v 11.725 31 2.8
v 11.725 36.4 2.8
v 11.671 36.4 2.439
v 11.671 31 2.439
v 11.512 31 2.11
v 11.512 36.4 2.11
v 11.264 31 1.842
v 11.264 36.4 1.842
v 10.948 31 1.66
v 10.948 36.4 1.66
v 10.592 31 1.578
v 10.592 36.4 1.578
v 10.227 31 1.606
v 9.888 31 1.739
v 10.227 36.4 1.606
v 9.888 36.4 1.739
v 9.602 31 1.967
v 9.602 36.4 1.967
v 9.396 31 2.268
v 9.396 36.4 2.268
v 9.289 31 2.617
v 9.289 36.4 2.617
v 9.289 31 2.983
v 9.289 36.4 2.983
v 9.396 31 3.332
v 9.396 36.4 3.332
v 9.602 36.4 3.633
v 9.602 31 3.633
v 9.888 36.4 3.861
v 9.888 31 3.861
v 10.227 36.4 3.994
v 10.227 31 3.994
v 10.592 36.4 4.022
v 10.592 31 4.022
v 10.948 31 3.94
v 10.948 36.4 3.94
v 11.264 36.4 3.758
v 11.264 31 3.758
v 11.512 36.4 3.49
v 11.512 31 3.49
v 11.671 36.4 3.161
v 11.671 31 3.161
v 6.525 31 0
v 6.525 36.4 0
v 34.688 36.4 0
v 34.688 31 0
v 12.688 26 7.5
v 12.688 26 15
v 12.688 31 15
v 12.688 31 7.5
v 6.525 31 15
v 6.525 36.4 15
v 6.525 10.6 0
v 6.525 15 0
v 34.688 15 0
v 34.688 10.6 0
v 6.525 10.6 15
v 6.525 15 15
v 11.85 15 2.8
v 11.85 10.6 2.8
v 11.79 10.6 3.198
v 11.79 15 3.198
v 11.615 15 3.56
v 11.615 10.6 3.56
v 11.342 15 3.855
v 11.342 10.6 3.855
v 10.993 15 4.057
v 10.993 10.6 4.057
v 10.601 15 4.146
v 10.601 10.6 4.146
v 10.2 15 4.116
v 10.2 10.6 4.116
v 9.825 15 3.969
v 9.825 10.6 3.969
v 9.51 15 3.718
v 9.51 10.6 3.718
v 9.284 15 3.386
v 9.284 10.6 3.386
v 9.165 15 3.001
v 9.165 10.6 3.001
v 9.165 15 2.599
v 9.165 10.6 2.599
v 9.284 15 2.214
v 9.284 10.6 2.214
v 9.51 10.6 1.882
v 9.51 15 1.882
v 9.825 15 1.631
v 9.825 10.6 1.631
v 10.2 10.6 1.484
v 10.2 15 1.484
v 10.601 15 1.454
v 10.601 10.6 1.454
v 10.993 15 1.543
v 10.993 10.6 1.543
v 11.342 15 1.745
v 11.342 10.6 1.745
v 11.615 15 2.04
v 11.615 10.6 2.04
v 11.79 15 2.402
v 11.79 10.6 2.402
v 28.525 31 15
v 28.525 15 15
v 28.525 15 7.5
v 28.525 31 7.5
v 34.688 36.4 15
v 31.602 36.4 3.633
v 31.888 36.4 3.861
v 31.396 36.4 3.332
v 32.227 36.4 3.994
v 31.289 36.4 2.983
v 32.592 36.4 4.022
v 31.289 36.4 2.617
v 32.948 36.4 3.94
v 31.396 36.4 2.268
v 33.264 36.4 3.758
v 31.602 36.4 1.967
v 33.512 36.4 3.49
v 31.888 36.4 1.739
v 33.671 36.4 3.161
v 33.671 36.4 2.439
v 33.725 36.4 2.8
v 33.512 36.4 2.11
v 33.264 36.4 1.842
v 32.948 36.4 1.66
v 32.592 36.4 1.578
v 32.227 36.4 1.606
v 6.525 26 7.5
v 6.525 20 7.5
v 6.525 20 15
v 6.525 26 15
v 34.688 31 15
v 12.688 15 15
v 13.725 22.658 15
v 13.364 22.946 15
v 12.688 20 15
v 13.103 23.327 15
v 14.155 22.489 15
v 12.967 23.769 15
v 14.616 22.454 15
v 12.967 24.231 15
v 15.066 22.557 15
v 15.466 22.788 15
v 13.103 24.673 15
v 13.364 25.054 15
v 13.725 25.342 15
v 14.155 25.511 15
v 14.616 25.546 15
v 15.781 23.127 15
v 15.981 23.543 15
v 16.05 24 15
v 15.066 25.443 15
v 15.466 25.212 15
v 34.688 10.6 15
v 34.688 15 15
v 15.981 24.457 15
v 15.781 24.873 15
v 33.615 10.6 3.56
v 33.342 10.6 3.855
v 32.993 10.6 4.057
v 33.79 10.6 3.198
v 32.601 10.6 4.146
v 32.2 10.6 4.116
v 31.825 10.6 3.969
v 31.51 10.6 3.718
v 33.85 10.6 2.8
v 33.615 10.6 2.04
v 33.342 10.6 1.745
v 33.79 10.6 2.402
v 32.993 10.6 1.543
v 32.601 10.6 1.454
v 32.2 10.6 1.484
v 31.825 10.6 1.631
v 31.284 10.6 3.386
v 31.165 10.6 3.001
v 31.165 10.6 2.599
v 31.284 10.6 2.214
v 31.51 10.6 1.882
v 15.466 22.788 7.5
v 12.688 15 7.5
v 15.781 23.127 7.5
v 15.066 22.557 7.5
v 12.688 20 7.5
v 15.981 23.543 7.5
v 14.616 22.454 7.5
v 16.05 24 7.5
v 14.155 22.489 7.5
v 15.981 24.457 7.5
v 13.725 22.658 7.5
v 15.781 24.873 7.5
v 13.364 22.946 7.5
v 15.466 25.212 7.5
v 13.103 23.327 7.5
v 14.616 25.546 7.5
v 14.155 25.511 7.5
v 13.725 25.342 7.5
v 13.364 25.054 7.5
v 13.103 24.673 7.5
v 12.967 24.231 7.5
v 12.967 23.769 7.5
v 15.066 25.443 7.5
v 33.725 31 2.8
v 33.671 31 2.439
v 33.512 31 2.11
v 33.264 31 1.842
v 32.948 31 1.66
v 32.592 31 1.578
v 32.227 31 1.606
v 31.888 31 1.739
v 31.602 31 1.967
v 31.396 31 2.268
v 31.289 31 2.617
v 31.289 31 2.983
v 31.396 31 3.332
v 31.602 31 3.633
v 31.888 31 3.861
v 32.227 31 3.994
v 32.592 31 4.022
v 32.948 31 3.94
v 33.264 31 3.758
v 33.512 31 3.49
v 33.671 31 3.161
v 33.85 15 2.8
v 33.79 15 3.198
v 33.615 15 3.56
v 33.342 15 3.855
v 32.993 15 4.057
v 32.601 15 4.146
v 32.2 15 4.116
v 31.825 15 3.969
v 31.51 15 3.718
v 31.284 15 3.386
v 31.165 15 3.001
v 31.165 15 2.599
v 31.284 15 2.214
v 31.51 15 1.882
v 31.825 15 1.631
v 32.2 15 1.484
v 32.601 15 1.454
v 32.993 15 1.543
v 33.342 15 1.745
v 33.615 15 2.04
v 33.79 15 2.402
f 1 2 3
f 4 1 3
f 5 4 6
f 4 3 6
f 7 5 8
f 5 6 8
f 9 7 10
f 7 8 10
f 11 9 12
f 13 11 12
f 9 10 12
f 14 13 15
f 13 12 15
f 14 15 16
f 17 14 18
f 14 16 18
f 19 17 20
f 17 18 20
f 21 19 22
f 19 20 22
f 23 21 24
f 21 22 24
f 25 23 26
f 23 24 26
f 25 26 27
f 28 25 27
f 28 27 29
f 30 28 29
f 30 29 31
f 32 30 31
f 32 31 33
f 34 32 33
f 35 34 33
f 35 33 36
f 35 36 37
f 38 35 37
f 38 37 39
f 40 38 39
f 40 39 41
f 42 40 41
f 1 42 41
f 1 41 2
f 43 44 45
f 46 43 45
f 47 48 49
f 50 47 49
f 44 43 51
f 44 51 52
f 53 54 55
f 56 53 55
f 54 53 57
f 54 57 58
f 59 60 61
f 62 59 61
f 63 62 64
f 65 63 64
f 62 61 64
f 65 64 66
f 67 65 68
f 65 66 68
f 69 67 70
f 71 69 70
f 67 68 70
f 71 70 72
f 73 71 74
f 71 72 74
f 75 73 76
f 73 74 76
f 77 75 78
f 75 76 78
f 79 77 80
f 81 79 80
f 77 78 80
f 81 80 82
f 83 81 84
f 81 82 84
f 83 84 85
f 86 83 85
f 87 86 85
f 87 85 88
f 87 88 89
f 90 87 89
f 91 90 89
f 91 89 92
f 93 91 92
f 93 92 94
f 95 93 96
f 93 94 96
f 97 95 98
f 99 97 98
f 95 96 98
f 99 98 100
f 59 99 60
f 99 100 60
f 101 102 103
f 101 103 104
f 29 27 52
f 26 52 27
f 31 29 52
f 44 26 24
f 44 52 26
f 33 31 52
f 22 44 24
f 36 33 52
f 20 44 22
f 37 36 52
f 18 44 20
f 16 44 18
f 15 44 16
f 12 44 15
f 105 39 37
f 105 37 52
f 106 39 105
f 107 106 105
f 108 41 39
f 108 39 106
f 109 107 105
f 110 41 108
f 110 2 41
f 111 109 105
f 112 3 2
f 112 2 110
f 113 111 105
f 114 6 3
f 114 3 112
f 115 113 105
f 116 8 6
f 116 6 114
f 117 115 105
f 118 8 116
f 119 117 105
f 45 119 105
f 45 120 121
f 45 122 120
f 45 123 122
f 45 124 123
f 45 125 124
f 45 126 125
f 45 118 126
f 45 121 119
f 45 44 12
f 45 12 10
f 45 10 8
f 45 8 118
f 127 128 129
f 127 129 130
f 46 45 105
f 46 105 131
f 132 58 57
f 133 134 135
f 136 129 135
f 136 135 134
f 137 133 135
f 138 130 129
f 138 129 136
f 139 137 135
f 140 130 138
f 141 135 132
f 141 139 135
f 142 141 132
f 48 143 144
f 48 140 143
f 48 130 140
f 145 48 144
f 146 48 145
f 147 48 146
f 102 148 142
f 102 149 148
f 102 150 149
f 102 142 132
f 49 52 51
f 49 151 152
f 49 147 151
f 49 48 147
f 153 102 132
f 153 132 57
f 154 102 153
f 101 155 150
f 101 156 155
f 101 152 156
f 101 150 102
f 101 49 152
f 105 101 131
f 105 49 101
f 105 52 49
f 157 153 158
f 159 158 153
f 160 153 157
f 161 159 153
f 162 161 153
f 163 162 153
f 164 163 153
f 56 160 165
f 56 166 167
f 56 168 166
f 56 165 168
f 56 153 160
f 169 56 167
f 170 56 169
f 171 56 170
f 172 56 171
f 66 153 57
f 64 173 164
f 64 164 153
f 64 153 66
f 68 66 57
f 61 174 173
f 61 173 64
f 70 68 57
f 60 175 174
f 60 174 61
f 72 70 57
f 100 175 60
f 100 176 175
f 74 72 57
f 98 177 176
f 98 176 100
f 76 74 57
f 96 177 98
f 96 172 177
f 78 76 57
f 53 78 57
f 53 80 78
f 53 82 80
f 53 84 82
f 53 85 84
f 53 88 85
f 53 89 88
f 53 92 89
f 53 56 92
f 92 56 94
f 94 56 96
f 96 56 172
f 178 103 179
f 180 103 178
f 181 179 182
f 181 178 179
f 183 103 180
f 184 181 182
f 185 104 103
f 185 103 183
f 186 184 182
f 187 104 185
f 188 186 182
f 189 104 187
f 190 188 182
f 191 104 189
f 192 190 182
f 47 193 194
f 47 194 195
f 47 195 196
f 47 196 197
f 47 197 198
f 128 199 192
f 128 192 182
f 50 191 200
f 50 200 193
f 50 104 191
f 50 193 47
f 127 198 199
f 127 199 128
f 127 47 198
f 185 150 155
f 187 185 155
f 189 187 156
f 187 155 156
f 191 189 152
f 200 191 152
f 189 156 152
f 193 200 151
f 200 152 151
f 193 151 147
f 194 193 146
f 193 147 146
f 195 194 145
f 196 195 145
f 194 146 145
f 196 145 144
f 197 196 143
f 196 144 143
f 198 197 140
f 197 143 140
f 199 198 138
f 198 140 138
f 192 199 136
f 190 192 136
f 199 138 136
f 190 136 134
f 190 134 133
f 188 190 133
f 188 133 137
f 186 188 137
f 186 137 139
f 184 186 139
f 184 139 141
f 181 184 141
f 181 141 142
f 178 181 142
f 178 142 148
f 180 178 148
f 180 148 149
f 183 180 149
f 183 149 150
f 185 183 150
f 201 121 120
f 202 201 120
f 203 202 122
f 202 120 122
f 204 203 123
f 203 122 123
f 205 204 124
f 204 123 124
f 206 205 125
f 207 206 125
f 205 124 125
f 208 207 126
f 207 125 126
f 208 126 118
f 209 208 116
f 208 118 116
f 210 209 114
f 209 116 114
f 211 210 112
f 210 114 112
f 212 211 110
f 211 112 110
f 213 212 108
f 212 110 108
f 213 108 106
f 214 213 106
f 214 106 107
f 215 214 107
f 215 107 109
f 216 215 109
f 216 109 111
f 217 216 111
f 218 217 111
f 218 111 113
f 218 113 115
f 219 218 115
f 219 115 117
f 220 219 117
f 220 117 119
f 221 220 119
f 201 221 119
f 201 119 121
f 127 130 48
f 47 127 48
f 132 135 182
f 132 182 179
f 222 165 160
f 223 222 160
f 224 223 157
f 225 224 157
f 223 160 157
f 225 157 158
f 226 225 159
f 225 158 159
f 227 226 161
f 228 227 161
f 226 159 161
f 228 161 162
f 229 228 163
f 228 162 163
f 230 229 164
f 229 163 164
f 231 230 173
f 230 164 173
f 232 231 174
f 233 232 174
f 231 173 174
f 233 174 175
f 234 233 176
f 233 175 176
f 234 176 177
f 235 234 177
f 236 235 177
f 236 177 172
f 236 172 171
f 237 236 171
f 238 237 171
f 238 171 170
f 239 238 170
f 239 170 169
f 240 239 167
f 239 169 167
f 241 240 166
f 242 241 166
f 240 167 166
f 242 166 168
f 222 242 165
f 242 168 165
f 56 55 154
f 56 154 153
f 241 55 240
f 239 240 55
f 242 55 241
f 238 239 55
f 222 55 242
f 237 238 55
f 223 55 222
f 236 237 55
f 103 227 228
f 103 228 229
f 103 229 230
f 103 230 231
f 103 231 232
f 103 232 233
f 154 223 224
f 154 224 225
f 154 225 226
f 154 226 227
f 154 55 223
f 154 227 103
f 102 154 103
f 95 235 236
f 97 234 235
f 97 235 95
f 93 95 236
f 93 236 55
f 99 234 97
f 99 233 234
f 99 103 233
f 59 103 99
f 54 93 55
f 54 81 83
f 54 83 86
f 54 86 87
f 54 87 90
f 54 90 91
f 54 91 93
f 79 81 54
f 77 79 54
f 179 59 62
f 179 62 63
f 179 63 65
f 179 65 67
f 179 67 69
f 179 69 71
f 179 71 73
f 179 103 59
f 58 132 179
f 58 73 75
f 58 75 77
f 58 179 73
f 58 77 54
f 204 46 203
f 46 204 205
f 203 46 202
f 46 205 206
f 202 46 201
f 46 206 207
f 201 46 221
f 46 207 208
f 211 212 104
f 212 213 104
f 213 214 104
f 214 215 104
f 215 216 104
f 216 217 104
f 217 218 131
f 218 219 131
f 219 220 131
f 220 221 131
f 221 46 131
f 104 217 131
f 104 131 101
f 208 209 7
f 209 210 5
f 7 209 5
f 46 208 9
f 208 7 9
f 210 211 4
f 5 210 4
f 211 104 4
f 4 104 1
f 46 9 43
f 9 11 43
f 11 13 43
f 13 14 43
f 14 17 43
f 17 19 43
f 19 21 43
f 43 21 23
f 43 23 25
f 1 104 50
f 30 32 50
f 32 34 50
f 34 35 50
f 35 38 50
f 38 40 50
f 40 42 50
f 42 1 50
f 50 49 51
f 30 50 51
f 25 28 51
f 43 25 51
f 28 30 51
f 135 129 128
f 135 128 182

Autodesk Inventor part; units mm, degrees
ref_plane "YZ Plane" through (0, 0, 0) normal (1, 0, 0) x (0, 1, 0)
ref_plane "XZ Plane" through (0, 0, 0) normal (0, 1, 0) x (-1, 0, 0)
ref_plane "XY Plane" through (0, 0, 0) normal (0, 0, 1) x (1, 0, 0)
sketch "스케치1" plane through (0, 0, 0) normal (0, 0, 1) x (1, 0, 0)
  line L0 (7.5, 38) -> (7.5, 36.5) projected
  line L1 (2, 38) -> (7.5, 38) projected
  line L2 (2, 38) -> (2, 8) projected
  line L3 (2, 8) -> (6.525, 8) projected
  line L4 (6.525, 10.5) -> (6.525, 8) projected
  line L5 (6.525, 10.5) -> (10.3997, 10.5) projected
  line L6 (10.3997, 10.5) -> (10.6003, 10.5) projected
  line L7 (10.6003, 10.5) -> (14.475, 10.5) projected
  line L8 (14.475, 10.5) -> (14.475, 8) projected
  line L9 (14.475, 8) -> (28.525, 8) projected
  line L10 (28.525, 10.5) -> (28.525, 8) projected
  line L11 (28.525, 10.5) -> (32.3997, 10.5) projected
  line L12 (32.3997, 10.5) -> (32.6003, 10.5) projected
  line L13 (32.6003, 10.5) -> (34.7876, 10.5) projected
  line L14 (34.7876, 10.5) -> (34.7876, 19.4) projected
  line L15 (36, 19.4) -> (34.7876, 19.4) projected
  line L16 (36, 24) -> (36, 19.4) projected
  line L17 (38.55, 24) -> (36, 24) projected
  line L18 (38.55, 24) -> (38.55, 25.4) projected
  line L19 (38.55, 25.4) -> (37.1, 25.4) projected
  line L20 (37.1, 25.4) -> (37.1, 35.5) projected
  line L21 (49.9, 35.5) -> (37.1, 35.5) projected
  line L22 (49.9, 25.4) -> (49.9, 35.5) projected
  line L23 (49.9, 25.4) -> (48.45, 25.4) projected
  line L24 (48.45, 24) -> (48.45, 25.4) projected
  line L25 (51, 24) -> (48.45, 24) projected
  line L26 (51, 24) -> (51, 10.5) projected
  line L27 (51, 10.5) -> (54.3997, 10.5) projected
  line L28 (54.3997, 10.5) -> (54.6003, 10.5) projected
  line L29 (54.6003, 10.5) -> (57.5, 10.5) projected
  line L30 (57.5, 36.5) -> (57.5, 10.5) projected
  line L31 (57.5, 36.5) -> (51.5, 36.5) projected
  line L32 (51.5, 38) -> (51.5, 36.5) projected
  line L33 (35.5, 38) -> (51.5, 38) projected
  line L34 (35.5, 36.5) -> (35.5, 38) projected
  line L35 (35.5, 36.5) -> (29.5, 36.5) projected
  line L36 (29.5, 38) -> (29.5, 36.5) projected
  line L37 (13.5, 38) -> (29.5, 38) projected
  line L38 (13.5, 36.5) -> (13.5, 38) projected
  line L39 (13.5, 36.5) -> (7.5, 36.5) projected
  line L40 (22.05, 14.2) -> (27.95, 14.2) projected
  line L41 (22.05, 18) -> (22.05, 14.2) projected
  line L42 (27.95, 18) -> (22.05, 18) projected
  line L43 (27.95, 14.2) -> (27.95, 18) projected
  line L44 (34.6876, 10.6) -> (7.6, 10.6)
  line L45 (7.6, 10.6) -> (7.6, 36.4)
  line L46 (7.6, 36.4) -> (34.6876, 36.4)
  line L47 (34.6876, 36.4) -> (34.6876, 10.6)
  line L48 (7.6, 36.4) -> (6.525, 36.4)
  line L49 (7.6, 10.6) -> (6.525, 10.6)
  line L50 (6.525, 10.6) -> (6.525, 36.4)
  line L51 (6.525, 36.4) -> (7.6, 36.4)
  line L52 (7.6, 36.4) -> (7.6, 10.6)
  point P0 (0, 0)
extrude "돌출1" add sketch "스케치1" along normal blind 15 contours L41 L42 L43 L40 | L44 L45 L46 L47 | L49 L50 L48 L45
sketch "스케치2" plane through (0, 0, 15) normal (0, 0, 1) x (1, 0, 0)
  line L0 (34.5, 38) -> (52.5, 38) projected
  line L1 (52.5, 38) -> (52.5, 36.5) projected
  line L2 (56.5, 36.5) -> (52.5, 36.5) projected
  line L3 (56.5, 38) -> (56.5, 36.5) projected
  line L4 (56.5, 38) -> (59.1, 38) projected
  line L5 (59.1, 38) -> (59.1, 40) projected
  line L6 (6, 40) -> (59.1, 40) projected
  line L7 (6, 38) -> (6, 40) projected
  line L8 (6, 38) -> (8.5, 38) projected
  line L9 (8.5, 38) -> (8.5, 36.5) projected
  line L10 (12.5, 36.5) -> (8.5, 36.5) projected
  line L11 (12.5, 38) -> (12.5, 36.5) projected
  line L12 (12.5, 38) -> (30.5, 38) projected
  line L13 (30.5, 38) -> (30.5, 36.5) projected
  line L14 (34.5, 36.5) -> (30.5, 36.5) projected
  line L15 (34.5, 38) -> (34.5, 36.5) projected
  line L16 (14.475, 10.5) -> (12.975, 10.5) projected
  line L17 (12.975, 10.5) -> (12.975, 8.5) projected
  line L18 (12.975, 8.5) -> (8.025, 8.5) projected
  line L19 (8.025, 10.5) -> (8.025, 8.5) projected
  line L20 (8.025, 10.5) -> (6.525, 10.5) projected
  line L21 (6.525, 10.5) -> (6.525, 8) projected
  line L22 (6, 8) -> (6.525, 8) projected
  line L23 (6, 8) -> (6, 6) projected
  line L24 (6, 6) -> (59.1, 6) projected
  line L25 (59.1, 8) -> (59.1, 6) projected
  line L26 (58.475, 8) -> (59.1, 8) projected
  line L27 (58.475, 8) -> (58.475, 10.5) projected
  line L28 (58.475, 10.5) -> (56.975, 10.5) projected
  line L29 (56.975, 10.5) -> (56.975, 8.5) projected
  line L30 (56.975, 8.5) -> (52.025, 8.5) projected
  line L31 (52.025, 10.5) -> (52.025, 8.5) projected
  line L32 (52.025, 10.5) -> (50.525, 10.5) projected
  line L33 (50.525, 10.5) -> (50.525, 8) projected
  line L34 (36.475, 8) -> (50.525, 8) projected
  line L35 (36.475, 8) -> (36.475, 10.5) projected
  line L36 (36.475, 10.5) -> (34.975, 10.5) projected
  line L37 (34.975, 10.5) -> (34.975, 8.5) projected
  line L38 (34.975, 8.5) -> (30.025, 8.5) projected
  line L39 (30.025, 10.5) -> (30.025, 8.5) projected
  line L40 (30.025, 10.5) -> (28.525, 10.5) projected
  line L41 (28.525, 10.5) -> (28.525, 8) projected
  line L42 (14.475, 8) -> (28.525, 8) projected
  line L43 (14.475, 8) -> (14.475, 10.5) projected
  line L44 (14.475, 36.4) -> (28.525, 36.4)
  line L45 (34.6876, 10.6) -> (34.6876, 36.4) projected
  line L46 (14.475, 10.6) -> (28.525, 10.6)
  line L47 (28.525, 10.6) -> (28.525, 36.4)
  line L48 (28.525, 36.4) -> (14.475, 36.4)
  line L49 (-13.0231, 23) -> (78.1205, 23)
  line L50 (14.5, -11.1) -> (14.5, 56.1)
  line L51 (34.6876, 36.4) -> (6.525, 36.4) projected
  line L52 (6.525, 36.4) -> (6.525, 10.6) projected
  line L53 (6.525, 10.6) -> (34.6876, 10.6) projected
  line L54 (28.525, 23) -> (34.6876, 23)
  line L55 (34.6876, 23) -> (34.6876, 31)
  line L56 (34.6876, 31) -> (28.525, 31)
  line L57 (28.525, 31) -> (28.525, 23)
  line L58 (28.525, 23) -> (34.6876, 23)
  line L59 (34.6876, 23) -> (34.6876, 15)
  line L60 (34.6876, 15) -> (28.525, 15)
  line L61 (28.525, 15) -> (28.525, 23)
  line L62 (6.525, 23) -> (12.688, 23)
  line L63 (12.688, 23) -> (12.688, 31)
  line L64 (12.688, 31) -> (6.525, 31)
  line L65 (6.525, 31) -> (6.525, 23)
  line L66 (14.5, 57.1) -> (14.5, -10.1)
  line L67 (12.688, 23) -> (12.688, 15)
  line L68 (12.688, 15) -> (6.525, 15)
  line L69 (6.525, 15) -> (6.525, 23)
  line L70 (6.525, 36.4) -> (6.525, 10.6) projected
  line L71 (12.688, 23) -> (6.525, 23)
  line L72 (6.525, 23) -> (6.525, 26)
  line L73 (6.525, 26) -> (12.688, 26)
  line L74 (12.688, 26) -> (12.688, 23)
  line L75 (12.688, 23) -> (6.525, 23)
  line L76 (6.525, 23) -> (6.525, 20)
  line L77 (6.525, 20) -> (12.688, 20)
  line L78 (12.688, 20) -> (12.688, 23)
  point P0 (0, 0)
  dimension "d3" = 6.163
  dimension "d4" = 8
extrude "돌출2" cut sketch "스케치2" against normal up to next contours L56 L45 L49 L47 | L49 L45 L60 L47 | L64 L63 L73 L52 | L67 L68 L52 L77
sketch "스케치4" plane through (6.525, 10.6, 0) normal (0, -1, 0) x (1, 0, 0)
  circle A0 centre (3.975, 2.8) radius 1.35 projected
  circle A1 centre (25.975, 2.8) radius 1.35
  circle A2 centre (25.975, 2.8) radius 1.55
  circle A3 centre (3.975, 2.8) radius 1.55
  point P0 (-6.525, 0)
  dimension "d14" = 0.2
  dimension "d15" = 0.2
extrude "돌출4" cut sketch "스케치4" against normal up to next contours A0 | A1
sketch "스케치5" plane through (6.525, 36.4, 0) normal (0, 1, 0) x (1, 0, 0)
  circle A0 centre (25.975, -2.8) radius 1.025 projected
  circle A1 centre (3.975, -2.8) radius 1.025 projected
  circle A2 centre (25.975, -2.8) radius 1.225
  circle A3 centre (3.975, -2.8) radius 1.225
  point P0 (-6.525, 0)
  dimension "d16" = 0.2
  dimension "d17" = 0.2
extrude "돌출5" cut sketch "스케치5" against normal up to next contours A0 | A1 | A2 | A3
sketch "스케치6" plane through (0, 0, 0) normal (0, 0, -1) x (-1, 0, 0)
  line L0 (-28.525, 31) -> (-34.6876, 31) projected
  line L1 (-34.6876, 31) -> (-34.6876, 36.4) projected
  line L2 (-34.6876, 36.4) -> (-6.525, 36.4) projected
  line L3 (-6.525, 36.4) -> (-6.525, 31) projected
  line L4 (-6.525, 31) -> (-12.688, 31) projected
  line L5 (-12.688, 31) -> (-12.688, 26) projected
  line L6 (-12.688, 26) -> (-6.525, 26) projected
  line L7 (-6.525, 26) -> (-6.525, 20) projected
  line L8 (-6.525, 20) -> (-12.688, 20) projected
  line L9 (-12.688, 20) -> (-12.688, 15) projected
  line L10 (-12.688, 15) -> (-6.525, 15) projected
  line L11 (-6.525, 15) -> (-6.525, 10.6) projected
  line L12 (-6.525, 10.6) -> (-34.6876, 10.6) projected
  line L13 (-34.6876, 10.6) -> (-34.6876, 15) projected
  line L14 (-34.6876, 15) -> (-28.525, 15) projected
  line L15 (-28.525, 15) -> (-28.525, 31) projected
  line L16 (-12.688, 31) -> (-28.525, 31)
  line L17 (-28.525, 31) -> (-28.525, 15)
  line L18 (-28.525, 15) -> (-12.688, 15)
  line L19 (-12.688, 15) -> (-12.688, 31)
  line L20 (13.0231, 24) -> (-78.1205, 24)
  line L21 (-14.5, 58.1) -> (-14.5, -9.1)
  point P0 (0, 0)
extrude "돌출6" cut sketch "스케치6" against normal blind 7.5 contours L16 L21 L20 L15 | L20 L21 L18 L15 | L16 L5 L19 L20 L21 | L20 L19 L9 L18 L21 | L20 L7 L8 L19 | L19 L6 L7 L20
sketch "스케치7" plane through (0, 0, 15) normal (0, 0, 1) x (1, 0, 0)
  circle A0 centre (14.5, 24) radius 1.55 projected
  point P0 (0, 0)
extrude "돌출7" cut sketch "스케치7" against normal up to next
properties part number "foot_bridge"
